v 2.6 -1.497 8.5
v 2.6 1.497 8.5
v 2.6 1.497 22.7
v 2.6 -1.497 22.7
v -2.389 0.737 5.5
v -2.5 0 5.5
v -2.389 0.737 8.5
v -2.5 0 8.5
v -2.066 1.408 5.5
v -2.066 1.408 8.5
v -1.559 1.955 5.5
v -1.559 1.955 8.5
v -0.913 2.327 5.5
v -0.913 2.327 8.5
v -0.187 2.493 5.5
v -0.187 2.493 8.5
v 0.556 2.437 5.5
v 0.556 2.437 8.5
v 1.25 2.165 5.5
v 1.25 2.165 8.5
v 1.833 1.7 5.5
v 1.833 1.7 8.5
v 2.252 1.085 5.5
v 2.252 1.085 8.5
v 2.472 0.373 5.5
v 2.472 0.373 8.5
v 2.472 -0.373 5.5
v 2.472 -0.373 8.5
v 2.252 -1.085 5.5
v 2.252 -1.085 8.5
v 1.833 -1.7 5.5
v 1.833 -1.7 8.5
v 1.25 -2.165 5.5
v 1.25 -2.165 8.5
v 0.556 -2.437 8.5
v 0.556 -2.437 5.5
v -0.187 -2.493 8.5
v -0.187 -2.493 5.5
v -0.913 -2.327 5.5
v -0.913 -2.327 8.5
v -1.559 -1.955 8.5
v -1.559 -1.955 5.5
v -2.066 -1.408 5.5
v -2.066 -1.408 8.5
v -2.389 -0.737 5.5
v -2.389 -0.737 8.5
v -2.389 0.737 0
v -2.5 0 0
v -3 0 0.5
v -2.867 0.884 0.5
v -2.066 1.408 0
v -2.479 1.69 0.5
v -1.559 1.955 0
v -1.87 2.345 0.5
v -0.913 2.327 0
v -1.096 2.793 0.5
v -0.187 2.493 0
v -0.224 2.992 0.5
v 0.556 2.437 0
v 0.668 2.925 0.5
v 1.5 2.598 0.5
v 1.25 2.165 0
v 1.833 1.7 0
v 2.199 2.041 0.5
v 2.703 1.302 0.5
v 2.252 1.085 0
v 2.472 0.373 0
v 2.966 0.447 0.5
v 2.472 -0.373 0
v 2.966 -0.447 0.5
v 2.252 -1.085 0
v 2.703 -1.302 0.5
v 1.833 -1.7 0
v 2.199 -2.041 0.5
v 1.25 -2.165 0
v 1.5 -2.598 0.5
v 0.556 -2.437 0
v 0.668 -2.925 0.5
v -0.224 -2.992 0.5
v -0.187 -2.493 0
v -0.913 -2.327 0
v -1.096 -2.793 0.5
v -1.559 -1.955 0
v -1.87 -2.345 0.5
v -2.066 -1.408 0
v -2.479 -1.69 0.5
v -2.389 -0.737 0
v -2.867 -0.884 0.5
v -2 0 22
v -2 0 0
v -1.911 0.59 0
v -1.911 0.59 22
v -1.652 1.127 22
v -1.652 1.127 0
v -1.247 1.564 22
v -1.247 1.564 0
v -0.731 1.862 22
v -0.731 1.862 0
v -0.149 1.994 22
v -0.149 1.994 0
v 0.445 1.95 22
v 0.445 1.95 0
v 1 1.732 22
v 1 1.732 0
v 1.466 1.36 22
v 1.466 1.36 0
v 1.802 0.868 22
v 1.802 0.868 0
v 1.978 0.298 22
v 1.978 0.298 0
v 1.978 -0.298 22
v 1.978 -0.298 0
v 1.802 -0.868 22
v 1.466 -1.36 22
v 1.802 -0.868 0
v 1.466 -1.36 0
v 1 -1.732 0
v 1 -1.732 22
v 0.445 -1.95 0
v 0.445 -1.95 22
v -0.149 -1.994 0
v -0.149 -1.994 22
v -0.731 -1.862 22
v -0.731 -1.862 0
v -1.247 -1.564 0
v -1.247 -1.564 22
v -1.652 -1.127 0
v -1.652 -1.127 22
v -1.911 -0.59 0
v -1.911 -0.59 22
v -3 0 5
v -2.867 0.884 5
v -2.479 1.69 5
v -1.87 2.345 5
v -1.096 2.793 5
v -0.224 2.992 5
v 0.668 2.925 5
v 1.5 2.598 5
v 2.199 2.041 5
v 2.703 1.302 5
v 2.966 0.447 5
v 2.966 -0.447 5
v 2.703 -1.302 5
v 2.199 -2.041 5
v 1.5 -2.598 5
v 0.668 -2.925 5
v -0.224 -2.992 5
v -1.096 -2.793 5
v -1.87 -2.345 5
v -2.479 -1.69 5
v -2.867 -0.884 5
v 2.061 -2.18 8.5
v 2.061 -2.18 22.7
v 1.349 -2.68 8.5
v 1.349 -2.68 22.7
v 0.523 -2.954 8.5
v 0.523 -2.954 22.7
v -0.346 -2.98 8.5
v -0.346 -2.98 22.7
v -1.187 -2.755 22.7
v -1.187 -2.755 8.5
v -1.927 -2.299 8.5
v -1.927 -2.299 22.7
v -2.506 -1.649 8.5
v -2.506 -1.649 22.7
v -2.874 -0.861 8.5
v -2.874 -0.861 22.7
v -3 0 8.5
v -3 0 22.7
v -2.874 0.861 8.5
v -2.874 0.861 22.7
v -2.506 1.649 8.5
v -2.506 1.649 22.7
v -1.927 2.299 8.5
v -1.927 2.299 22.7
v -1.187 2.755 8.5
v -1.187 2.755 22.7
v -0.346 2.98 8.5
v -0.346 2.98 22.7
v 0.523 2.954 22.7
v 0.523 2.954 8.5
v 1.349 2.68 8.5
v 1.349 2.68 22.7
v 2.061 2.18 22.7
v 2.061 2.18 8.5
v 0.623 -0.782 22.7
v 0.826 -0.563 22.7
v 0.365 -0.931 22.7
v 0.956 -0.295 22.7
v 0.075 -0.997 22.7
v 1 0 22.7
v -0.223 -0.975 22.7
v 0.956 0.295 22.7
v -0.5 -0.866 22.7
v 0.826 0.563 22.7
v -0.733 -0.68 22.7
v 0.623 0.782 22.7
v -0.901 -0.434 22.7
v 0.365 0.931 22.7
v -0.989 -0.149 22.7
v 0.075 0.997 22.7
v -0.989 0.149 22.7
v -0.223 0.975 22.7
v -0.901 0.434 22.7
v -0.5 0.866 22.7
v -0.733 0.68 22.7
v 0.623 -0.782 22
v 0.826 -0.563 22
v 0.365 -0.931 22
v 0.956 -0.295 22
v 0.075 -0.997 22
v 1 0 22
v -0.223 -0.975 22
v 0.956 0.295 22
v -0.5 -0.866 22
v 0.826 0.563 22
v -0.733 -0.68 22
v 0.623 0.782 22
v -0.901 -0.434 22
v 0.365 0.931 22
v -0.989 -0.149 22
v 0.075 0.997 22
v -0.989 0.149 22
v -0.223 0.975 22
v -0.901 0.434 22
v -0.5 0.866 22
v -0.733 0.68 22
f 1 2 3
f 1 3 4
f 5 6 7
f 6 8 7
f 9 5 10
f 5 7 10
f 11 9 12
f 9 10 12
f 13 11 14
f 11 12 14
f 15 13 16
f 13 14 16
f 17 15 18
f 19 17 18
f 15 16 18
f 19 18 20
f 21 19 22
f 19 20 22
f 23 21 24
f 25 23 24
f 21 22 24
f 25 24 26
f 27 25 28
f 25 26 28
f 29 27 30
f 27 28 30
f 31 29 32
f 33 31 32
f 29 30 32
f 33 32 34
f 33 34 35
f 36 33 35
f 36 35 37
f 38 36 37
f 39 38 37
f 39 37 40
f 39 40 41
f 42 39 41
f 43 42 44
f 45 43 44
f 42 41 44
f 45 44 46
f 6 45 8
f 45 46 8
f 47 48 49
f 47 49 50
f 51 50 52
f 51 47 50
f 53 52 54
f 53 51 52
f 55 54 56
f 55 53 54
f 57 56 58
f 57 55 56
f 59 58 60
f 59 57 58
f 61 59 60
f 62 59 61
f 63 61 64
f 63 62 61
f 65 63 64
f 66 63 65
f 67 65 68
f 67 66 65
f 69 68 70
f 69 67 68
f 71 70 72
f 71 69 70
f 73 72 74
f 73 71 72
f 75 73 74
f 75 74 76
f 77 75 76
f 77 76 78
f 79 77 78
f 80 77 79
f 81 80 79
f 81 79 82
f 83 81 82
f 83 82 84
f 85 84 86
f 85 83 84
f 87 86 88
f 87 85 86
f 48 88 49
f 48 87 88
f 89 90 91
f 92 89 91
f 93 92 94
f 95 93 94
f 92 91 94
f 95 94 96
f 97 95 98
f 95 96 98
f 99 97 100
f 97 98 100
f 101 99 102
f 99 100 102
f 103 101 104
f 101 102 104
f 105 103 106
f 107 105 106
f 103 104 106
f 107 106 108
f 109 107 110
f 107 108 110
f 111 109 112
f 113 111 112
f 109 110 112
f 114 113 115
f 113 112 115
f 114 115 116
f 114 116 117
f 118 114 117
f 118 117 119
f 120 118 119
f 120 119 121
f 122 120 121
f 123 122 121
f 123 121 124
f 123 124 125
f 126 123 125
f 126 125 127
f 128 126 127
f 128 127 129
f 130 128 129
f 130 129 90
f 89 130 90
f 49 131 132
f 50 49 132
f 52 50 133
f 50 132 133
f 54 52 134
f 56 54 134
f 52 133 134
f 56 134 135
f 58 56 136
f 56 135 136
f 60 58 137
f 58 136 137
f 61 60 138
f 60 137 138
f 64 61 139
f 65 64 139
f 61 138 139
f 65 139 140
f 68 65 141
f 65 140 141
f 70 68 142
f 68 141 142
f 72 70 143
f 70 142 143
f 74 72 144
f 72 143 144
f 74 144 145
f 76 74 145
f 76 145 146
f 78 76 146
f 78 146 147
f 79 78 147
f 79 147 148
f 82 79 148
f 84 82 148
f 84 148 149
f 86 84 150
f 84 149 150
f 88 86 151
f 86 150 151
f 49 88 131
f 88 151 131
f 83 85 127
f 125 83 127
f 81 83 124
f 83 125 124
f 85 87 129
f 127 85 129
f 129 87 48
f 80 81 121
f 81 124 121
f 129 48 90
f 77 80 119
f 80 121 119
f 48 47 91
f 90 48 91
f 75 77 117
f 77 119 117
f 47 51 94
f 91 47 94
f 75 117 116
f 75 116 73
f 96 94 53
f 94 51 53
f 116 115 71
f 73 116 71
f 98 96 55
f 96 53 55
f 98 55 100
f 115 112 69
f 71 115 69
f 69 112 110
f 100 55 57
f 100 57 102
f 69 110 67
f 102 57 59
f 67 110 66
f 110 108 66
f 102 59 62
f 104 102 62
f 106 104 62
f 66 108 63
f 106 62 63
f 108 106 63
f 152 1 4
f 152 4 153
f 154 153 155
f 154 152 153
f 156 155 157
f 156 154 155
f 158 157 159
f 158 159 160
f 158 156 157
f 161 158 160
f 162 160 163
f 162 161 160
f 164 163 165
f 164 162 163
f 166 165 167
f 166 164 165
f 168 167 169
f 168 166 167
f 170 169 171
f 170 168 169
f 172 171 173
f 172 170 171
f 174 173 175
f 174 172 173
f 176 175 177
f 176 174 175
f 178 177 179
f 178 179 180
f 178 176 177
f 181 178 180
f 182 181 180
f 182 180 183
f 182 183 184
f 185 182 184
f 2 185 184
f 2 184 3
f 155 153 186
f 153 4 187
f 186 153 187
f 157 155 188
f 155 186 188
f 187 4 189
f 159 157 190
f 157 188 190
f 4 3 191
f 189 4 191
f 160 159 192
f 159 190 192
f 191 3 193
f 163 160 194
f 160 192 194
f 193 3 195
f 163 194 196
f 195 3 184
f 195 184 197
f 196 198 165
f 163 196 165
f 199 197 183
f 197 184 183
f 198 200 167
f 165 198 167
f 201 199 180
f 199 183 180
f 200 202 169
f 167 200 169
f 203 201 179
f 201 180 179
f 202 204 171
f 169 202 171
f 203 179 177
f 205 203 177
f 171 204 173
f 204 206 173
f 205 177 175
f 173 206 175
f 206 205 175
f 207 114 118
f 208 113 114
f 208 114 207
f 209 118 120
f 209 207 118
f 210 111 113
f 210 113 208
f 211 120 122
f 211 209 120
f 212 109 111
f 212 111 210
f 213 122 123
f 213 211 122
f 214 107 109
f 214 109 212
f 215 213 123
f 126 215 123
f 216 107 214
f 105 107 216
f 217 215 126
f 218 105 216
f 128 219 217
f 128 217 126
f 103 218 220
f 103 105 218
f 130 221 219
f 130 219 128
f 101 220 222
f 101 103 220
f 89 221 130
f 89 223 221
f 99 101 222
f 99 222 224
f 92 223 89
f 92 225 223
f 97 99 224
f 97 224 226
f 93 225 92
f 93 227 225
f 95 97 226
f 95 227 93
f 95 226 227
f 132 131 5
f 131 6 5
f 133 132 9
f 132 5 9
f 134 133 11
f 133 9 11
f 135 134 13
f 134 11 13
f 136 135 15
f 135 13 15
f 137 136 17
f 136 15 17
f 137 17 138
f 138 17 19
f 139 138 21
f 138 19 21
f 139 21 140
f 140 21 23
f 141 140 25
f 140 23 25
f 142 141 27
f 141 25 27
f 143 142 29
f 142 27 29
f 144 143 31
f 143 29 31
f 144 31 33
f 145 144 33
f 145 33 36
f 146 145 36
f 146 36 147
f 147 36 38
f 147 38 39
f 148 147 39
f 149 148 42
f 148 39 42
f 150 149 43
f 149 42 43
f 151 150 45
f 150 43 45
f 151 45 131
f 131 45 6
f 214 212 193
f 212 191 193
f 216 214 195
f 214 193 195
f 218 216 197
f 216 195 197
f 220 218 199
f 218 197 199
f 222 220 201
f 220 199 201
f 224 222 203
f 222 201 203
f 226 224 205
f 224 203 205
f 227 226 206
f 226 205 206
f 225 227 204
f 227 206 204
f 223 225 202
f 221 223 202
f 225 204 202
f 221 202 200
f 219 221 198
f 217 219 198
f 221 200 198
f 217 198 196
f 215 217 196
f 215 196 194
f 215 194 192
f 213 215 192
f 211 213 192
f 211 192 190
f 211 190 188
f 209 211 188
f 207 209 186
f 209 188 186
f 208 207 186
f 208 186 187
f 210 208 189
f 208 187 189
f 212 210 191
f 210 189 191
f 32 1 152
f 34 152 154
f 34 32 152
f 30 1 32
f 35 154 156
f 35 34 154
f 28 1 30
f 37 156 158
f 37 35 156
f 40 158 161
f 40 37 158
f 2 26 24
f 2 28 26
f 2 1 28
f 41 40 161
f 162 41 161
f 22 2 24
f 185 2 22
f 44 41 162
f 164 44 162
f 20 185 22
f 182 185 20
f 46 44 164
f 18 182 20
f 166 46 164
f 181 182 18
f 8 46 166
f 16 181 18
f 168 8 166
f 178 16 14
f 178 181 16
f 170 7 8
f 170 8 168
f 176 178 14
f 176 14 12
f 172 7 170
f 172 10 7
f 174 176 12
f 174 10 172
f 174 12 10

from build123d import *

# Parameters (mm, degrees)
EXTRUDE_1_DEPTH               = 14.2
HOLE_WIZARD_M1_61_D           = 2
HOLE_WIZARD_M1_61_CBORE_D     = 4
HOLE_WIZARD_M1_61_CBORE_DEPTH = 22
CHAMFER_1_SIZE                = 0.5


with BuildPart() as part:
    # Эскиз1 → Бобышка-Вытянуть1 (new body)
    with BuildSketch(Plane(origin=(0, 0, 8.5), x_dir=(-1, 0, 0), z_dir=(0, 0, -1))):
        with BuildLine():
            Line((-2.6, 1.496662955), (-2.6, -1.496662955))
            ThreePointArc((-2.6, -1.496662955), (3, 0), (-2.6, 1.496662955))
        make_face()
    extrude(amount=-EXTRUDE_1_DEPTH)

    # Эскиз2 → Повернуть1 (revolve)
    with BuildSketch(Plane.XZ, mode=Mode.PRIVATE) as revolve_1_sk:
        Polygon((2.5, 8.5), (0, 8.5), (0, 0), (3, 0), (3, 5), (2.5, 5.5), align=None)
    revolve(revolve_1_sk.sketch.rotate(Axis((0, 0, 8.5), (0, 0, -1)), 180), axis=Axis((0, 0, 8.5), (0, 0, -1)))

    # Цековка для винта с внутренним шестигранником M1.61 (through all)
    with Locations(Plane(origin=(0, 0, 0), x_dir=(-1, 0, 0), z_dir=(0, 0, -1))):
        with Locations((0, 0)):
            CounterBoreHole(HOLE_WIZARD_M1_61_D / 2, HOLE_WIZARD_M1_61_CBORE_D / 2, HOLE_WIZARD_M1_61_CBORE_DEPTH)

    # Фаска1
    chamfer_1_edges = [part.edges().sort_by_distance(p)[0] for p in [
        (3, 0, 0),
    ]]
    chamfer(chamfer_1_edges, length=CHAMFER_1_SIZE)


solid = part.part
